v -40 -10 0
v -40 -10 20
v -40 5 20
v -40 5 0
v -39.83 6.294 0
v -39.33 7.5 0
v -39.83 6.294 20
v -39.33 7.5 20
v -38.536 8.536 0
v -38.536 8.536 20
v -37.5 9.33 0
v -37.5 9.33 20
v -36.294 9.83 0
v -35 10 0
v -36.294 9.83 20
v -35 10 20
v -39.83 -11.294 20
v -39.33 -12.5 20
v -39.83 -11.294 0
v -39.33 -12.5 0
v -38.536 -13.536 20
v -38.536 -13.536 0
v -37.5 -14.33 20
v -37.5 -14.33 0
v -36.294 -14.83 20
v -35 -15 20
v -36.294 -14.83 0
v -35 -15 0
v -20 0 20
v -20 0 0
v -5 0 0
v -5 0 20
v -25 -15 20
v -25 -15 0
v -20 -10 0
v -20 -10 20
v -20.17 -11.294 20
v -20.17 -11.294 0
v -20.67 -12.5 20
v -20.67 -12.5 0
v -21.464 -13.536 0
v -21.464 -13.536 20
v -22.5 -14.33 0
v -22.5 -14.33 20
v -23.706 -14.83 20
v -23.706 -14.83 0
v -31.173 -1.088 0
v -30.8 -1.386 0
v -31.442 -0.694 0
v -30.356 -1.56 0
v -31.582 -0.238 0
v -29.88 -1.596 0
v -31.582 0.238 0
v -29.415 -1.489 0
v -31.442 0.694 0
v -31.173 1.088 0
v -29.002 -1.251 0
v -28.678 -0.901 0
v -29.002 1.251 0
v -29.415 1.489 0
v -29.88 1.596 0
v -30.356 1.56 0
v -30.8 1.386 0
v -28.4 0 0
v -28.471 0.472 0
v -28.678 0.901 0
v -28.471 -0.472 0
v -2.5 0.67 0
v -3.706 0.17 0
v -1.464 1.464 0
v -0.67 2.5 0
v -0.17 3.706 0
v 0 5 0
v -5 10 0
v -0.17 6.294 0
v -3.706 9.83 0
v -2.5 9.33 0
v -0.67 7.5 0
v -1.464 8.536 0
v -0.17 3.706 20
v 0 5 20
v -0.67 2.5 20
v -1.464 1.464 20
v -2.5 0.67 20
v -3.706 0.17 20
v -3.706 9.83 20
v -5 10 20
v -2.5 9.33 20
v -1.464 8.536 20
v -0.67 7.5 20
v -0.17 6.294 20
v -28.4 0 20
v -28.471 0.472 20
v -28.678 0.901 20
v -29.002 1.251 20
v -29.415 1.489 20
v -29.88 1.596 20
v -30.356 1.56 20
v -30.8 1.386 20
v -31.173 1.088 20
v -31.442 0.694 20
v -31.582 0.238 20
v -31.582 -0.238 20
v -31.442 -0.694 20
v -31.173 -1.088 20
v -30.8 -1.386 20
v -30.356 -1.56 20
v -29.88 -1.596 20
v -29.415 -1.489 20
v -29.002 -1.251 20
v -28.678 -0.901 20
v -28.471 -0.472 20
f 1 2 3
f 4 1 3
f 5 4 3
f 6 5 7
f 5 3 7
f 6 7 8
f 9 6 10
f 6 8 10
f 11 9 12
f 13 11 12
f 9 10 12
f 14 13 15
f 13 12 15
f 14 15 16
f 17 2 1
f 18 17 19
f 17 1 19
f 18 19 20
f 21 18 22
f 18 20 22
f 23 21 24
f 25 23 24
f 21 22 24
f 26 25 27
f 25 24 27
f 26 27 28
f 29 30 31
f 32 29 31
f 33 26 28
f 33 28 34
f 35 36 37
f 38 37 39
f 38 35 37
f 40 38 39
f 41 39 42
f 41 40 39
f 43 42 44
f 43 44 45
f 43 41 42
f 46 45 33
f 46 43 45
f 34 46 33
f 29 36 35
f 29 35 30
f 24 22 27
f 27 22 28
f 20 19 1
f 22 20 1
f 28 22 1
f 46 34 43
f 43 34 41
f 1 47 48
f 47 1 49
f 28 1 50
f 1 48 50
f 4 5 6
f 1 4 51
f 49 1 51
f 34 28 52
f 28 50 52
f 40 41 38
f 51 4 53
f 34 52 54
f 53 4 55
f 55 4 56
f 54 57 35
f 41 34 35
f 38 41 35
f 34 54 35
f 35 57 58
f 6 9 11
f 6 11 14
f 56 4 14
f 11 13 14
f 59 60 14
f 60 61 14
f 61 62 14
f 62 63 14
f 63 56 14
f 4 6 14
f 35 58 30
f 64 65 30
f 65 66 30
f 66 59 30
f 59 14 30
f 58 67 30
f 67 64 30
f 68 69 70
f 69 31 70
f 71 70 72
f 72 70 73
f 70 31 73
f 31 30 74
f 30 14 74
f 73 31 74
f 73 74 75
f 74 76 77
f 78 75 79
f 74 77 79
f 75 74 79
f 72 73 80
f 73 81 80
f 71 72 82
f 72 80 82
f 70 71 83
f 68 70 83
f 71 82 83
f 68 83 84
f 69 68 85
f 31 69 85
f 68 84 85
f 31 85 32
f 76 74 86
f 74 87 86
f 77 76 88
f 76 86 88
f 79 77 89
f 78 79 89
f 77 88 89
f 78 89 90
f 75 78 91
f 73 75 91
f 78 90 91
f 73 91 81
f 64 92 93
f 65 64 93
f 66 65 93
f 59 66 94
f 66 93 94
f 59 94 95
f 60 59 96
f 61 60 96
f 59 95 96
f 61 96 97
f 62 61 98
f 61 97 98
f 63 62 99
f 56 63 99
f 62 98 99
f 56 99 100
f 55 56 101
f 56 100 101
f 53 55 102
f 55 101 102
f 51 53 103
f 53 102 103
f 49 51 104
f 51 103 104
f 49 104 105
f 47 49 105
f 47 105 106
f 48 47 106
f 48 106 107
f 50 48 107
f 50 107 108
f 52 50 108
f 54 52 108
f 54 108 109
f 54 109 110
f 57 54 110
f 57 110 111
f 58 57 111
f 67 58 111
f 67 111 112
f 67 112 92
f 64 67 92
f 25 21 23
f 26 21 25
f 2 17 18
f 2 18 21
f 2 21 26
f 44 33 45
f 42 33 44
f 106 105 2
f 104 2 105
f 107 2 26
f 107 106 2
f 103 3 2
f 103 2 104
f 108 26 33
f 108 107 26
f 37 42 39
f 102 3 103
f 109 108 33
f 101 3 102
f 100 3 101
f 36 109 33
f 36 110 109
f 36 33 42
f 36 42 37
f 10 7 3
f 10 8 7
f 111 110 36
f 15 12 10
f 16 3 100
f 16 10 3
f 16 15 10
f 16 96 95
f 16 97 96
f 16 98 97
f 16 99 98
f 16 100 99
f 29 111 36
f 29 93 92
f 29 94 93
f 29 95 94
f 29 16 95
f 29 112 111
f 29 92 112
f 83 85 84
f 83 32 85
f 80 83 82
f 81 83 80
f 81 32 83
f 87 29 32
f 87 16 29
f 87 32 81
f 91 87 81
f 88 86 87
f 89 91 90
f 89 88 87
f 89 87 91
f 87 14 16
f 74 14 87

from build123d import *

# Parameters (mm, degrees)
SKETCH_1_W          = 40
SKETCH_1_H          = 10
EXTRUDE_1_DEPTH     = 20
SKETCH_2_W          = 20
SKETCH_2_H          = 25
EXTRUDE_2_DEPTH     = 20
FILLET_1_R          = 5
SKETCH_3_R          = 1.6
CUT_EXTRUDE_1_DEPTH = 48.16990566


with BuildPart() as part:
    # 草图1 → 凸台-拉伸1 (new body)
    with BuildSketch(Plane.XY):
        with Locations((-20, 5)):
            Rectangle(SKETCH_1_W, SKETCH_1_H)
    extrude(amount=EXTRUDE_1_DEPTH)

    # 草图2 → 凸台-拉伸2 (add)
    with BuildSketch(Plane.XY.offset(20)):
        with Locations((-30, -2.5)):
            Rectangle(SKETCH_2_W, SKETCH_2_H)
    extrude(amount=-EXTRUDE_2_DEPTH)

    # 圆角1
    fillet_1_edges = [part.edges().sort_by_distance(p)[0] for p in [
        (0, 10, 10),
        (0, 0, 10),
        (-20, -15, 10),
        (-40, -15, 10),
        (-40, 10, 10),
    ]]
    fillet(fillet_1_edges, radius=FILLET_1_R - 0.0001)  # a hair under: the kernel refuses the full size

    # 草图3 → 切除-拉伸1 (cut, through all)
    with BuildSketch(Plane.XY.offset(20)):
        with Locations((-30, 0)):
            Circle(SKETCH_3_R)
    extrude(amount=-CUT_EXTRUDE_1_DEPTH, mode=Mode.SUBTRACT)


solid = part.part
